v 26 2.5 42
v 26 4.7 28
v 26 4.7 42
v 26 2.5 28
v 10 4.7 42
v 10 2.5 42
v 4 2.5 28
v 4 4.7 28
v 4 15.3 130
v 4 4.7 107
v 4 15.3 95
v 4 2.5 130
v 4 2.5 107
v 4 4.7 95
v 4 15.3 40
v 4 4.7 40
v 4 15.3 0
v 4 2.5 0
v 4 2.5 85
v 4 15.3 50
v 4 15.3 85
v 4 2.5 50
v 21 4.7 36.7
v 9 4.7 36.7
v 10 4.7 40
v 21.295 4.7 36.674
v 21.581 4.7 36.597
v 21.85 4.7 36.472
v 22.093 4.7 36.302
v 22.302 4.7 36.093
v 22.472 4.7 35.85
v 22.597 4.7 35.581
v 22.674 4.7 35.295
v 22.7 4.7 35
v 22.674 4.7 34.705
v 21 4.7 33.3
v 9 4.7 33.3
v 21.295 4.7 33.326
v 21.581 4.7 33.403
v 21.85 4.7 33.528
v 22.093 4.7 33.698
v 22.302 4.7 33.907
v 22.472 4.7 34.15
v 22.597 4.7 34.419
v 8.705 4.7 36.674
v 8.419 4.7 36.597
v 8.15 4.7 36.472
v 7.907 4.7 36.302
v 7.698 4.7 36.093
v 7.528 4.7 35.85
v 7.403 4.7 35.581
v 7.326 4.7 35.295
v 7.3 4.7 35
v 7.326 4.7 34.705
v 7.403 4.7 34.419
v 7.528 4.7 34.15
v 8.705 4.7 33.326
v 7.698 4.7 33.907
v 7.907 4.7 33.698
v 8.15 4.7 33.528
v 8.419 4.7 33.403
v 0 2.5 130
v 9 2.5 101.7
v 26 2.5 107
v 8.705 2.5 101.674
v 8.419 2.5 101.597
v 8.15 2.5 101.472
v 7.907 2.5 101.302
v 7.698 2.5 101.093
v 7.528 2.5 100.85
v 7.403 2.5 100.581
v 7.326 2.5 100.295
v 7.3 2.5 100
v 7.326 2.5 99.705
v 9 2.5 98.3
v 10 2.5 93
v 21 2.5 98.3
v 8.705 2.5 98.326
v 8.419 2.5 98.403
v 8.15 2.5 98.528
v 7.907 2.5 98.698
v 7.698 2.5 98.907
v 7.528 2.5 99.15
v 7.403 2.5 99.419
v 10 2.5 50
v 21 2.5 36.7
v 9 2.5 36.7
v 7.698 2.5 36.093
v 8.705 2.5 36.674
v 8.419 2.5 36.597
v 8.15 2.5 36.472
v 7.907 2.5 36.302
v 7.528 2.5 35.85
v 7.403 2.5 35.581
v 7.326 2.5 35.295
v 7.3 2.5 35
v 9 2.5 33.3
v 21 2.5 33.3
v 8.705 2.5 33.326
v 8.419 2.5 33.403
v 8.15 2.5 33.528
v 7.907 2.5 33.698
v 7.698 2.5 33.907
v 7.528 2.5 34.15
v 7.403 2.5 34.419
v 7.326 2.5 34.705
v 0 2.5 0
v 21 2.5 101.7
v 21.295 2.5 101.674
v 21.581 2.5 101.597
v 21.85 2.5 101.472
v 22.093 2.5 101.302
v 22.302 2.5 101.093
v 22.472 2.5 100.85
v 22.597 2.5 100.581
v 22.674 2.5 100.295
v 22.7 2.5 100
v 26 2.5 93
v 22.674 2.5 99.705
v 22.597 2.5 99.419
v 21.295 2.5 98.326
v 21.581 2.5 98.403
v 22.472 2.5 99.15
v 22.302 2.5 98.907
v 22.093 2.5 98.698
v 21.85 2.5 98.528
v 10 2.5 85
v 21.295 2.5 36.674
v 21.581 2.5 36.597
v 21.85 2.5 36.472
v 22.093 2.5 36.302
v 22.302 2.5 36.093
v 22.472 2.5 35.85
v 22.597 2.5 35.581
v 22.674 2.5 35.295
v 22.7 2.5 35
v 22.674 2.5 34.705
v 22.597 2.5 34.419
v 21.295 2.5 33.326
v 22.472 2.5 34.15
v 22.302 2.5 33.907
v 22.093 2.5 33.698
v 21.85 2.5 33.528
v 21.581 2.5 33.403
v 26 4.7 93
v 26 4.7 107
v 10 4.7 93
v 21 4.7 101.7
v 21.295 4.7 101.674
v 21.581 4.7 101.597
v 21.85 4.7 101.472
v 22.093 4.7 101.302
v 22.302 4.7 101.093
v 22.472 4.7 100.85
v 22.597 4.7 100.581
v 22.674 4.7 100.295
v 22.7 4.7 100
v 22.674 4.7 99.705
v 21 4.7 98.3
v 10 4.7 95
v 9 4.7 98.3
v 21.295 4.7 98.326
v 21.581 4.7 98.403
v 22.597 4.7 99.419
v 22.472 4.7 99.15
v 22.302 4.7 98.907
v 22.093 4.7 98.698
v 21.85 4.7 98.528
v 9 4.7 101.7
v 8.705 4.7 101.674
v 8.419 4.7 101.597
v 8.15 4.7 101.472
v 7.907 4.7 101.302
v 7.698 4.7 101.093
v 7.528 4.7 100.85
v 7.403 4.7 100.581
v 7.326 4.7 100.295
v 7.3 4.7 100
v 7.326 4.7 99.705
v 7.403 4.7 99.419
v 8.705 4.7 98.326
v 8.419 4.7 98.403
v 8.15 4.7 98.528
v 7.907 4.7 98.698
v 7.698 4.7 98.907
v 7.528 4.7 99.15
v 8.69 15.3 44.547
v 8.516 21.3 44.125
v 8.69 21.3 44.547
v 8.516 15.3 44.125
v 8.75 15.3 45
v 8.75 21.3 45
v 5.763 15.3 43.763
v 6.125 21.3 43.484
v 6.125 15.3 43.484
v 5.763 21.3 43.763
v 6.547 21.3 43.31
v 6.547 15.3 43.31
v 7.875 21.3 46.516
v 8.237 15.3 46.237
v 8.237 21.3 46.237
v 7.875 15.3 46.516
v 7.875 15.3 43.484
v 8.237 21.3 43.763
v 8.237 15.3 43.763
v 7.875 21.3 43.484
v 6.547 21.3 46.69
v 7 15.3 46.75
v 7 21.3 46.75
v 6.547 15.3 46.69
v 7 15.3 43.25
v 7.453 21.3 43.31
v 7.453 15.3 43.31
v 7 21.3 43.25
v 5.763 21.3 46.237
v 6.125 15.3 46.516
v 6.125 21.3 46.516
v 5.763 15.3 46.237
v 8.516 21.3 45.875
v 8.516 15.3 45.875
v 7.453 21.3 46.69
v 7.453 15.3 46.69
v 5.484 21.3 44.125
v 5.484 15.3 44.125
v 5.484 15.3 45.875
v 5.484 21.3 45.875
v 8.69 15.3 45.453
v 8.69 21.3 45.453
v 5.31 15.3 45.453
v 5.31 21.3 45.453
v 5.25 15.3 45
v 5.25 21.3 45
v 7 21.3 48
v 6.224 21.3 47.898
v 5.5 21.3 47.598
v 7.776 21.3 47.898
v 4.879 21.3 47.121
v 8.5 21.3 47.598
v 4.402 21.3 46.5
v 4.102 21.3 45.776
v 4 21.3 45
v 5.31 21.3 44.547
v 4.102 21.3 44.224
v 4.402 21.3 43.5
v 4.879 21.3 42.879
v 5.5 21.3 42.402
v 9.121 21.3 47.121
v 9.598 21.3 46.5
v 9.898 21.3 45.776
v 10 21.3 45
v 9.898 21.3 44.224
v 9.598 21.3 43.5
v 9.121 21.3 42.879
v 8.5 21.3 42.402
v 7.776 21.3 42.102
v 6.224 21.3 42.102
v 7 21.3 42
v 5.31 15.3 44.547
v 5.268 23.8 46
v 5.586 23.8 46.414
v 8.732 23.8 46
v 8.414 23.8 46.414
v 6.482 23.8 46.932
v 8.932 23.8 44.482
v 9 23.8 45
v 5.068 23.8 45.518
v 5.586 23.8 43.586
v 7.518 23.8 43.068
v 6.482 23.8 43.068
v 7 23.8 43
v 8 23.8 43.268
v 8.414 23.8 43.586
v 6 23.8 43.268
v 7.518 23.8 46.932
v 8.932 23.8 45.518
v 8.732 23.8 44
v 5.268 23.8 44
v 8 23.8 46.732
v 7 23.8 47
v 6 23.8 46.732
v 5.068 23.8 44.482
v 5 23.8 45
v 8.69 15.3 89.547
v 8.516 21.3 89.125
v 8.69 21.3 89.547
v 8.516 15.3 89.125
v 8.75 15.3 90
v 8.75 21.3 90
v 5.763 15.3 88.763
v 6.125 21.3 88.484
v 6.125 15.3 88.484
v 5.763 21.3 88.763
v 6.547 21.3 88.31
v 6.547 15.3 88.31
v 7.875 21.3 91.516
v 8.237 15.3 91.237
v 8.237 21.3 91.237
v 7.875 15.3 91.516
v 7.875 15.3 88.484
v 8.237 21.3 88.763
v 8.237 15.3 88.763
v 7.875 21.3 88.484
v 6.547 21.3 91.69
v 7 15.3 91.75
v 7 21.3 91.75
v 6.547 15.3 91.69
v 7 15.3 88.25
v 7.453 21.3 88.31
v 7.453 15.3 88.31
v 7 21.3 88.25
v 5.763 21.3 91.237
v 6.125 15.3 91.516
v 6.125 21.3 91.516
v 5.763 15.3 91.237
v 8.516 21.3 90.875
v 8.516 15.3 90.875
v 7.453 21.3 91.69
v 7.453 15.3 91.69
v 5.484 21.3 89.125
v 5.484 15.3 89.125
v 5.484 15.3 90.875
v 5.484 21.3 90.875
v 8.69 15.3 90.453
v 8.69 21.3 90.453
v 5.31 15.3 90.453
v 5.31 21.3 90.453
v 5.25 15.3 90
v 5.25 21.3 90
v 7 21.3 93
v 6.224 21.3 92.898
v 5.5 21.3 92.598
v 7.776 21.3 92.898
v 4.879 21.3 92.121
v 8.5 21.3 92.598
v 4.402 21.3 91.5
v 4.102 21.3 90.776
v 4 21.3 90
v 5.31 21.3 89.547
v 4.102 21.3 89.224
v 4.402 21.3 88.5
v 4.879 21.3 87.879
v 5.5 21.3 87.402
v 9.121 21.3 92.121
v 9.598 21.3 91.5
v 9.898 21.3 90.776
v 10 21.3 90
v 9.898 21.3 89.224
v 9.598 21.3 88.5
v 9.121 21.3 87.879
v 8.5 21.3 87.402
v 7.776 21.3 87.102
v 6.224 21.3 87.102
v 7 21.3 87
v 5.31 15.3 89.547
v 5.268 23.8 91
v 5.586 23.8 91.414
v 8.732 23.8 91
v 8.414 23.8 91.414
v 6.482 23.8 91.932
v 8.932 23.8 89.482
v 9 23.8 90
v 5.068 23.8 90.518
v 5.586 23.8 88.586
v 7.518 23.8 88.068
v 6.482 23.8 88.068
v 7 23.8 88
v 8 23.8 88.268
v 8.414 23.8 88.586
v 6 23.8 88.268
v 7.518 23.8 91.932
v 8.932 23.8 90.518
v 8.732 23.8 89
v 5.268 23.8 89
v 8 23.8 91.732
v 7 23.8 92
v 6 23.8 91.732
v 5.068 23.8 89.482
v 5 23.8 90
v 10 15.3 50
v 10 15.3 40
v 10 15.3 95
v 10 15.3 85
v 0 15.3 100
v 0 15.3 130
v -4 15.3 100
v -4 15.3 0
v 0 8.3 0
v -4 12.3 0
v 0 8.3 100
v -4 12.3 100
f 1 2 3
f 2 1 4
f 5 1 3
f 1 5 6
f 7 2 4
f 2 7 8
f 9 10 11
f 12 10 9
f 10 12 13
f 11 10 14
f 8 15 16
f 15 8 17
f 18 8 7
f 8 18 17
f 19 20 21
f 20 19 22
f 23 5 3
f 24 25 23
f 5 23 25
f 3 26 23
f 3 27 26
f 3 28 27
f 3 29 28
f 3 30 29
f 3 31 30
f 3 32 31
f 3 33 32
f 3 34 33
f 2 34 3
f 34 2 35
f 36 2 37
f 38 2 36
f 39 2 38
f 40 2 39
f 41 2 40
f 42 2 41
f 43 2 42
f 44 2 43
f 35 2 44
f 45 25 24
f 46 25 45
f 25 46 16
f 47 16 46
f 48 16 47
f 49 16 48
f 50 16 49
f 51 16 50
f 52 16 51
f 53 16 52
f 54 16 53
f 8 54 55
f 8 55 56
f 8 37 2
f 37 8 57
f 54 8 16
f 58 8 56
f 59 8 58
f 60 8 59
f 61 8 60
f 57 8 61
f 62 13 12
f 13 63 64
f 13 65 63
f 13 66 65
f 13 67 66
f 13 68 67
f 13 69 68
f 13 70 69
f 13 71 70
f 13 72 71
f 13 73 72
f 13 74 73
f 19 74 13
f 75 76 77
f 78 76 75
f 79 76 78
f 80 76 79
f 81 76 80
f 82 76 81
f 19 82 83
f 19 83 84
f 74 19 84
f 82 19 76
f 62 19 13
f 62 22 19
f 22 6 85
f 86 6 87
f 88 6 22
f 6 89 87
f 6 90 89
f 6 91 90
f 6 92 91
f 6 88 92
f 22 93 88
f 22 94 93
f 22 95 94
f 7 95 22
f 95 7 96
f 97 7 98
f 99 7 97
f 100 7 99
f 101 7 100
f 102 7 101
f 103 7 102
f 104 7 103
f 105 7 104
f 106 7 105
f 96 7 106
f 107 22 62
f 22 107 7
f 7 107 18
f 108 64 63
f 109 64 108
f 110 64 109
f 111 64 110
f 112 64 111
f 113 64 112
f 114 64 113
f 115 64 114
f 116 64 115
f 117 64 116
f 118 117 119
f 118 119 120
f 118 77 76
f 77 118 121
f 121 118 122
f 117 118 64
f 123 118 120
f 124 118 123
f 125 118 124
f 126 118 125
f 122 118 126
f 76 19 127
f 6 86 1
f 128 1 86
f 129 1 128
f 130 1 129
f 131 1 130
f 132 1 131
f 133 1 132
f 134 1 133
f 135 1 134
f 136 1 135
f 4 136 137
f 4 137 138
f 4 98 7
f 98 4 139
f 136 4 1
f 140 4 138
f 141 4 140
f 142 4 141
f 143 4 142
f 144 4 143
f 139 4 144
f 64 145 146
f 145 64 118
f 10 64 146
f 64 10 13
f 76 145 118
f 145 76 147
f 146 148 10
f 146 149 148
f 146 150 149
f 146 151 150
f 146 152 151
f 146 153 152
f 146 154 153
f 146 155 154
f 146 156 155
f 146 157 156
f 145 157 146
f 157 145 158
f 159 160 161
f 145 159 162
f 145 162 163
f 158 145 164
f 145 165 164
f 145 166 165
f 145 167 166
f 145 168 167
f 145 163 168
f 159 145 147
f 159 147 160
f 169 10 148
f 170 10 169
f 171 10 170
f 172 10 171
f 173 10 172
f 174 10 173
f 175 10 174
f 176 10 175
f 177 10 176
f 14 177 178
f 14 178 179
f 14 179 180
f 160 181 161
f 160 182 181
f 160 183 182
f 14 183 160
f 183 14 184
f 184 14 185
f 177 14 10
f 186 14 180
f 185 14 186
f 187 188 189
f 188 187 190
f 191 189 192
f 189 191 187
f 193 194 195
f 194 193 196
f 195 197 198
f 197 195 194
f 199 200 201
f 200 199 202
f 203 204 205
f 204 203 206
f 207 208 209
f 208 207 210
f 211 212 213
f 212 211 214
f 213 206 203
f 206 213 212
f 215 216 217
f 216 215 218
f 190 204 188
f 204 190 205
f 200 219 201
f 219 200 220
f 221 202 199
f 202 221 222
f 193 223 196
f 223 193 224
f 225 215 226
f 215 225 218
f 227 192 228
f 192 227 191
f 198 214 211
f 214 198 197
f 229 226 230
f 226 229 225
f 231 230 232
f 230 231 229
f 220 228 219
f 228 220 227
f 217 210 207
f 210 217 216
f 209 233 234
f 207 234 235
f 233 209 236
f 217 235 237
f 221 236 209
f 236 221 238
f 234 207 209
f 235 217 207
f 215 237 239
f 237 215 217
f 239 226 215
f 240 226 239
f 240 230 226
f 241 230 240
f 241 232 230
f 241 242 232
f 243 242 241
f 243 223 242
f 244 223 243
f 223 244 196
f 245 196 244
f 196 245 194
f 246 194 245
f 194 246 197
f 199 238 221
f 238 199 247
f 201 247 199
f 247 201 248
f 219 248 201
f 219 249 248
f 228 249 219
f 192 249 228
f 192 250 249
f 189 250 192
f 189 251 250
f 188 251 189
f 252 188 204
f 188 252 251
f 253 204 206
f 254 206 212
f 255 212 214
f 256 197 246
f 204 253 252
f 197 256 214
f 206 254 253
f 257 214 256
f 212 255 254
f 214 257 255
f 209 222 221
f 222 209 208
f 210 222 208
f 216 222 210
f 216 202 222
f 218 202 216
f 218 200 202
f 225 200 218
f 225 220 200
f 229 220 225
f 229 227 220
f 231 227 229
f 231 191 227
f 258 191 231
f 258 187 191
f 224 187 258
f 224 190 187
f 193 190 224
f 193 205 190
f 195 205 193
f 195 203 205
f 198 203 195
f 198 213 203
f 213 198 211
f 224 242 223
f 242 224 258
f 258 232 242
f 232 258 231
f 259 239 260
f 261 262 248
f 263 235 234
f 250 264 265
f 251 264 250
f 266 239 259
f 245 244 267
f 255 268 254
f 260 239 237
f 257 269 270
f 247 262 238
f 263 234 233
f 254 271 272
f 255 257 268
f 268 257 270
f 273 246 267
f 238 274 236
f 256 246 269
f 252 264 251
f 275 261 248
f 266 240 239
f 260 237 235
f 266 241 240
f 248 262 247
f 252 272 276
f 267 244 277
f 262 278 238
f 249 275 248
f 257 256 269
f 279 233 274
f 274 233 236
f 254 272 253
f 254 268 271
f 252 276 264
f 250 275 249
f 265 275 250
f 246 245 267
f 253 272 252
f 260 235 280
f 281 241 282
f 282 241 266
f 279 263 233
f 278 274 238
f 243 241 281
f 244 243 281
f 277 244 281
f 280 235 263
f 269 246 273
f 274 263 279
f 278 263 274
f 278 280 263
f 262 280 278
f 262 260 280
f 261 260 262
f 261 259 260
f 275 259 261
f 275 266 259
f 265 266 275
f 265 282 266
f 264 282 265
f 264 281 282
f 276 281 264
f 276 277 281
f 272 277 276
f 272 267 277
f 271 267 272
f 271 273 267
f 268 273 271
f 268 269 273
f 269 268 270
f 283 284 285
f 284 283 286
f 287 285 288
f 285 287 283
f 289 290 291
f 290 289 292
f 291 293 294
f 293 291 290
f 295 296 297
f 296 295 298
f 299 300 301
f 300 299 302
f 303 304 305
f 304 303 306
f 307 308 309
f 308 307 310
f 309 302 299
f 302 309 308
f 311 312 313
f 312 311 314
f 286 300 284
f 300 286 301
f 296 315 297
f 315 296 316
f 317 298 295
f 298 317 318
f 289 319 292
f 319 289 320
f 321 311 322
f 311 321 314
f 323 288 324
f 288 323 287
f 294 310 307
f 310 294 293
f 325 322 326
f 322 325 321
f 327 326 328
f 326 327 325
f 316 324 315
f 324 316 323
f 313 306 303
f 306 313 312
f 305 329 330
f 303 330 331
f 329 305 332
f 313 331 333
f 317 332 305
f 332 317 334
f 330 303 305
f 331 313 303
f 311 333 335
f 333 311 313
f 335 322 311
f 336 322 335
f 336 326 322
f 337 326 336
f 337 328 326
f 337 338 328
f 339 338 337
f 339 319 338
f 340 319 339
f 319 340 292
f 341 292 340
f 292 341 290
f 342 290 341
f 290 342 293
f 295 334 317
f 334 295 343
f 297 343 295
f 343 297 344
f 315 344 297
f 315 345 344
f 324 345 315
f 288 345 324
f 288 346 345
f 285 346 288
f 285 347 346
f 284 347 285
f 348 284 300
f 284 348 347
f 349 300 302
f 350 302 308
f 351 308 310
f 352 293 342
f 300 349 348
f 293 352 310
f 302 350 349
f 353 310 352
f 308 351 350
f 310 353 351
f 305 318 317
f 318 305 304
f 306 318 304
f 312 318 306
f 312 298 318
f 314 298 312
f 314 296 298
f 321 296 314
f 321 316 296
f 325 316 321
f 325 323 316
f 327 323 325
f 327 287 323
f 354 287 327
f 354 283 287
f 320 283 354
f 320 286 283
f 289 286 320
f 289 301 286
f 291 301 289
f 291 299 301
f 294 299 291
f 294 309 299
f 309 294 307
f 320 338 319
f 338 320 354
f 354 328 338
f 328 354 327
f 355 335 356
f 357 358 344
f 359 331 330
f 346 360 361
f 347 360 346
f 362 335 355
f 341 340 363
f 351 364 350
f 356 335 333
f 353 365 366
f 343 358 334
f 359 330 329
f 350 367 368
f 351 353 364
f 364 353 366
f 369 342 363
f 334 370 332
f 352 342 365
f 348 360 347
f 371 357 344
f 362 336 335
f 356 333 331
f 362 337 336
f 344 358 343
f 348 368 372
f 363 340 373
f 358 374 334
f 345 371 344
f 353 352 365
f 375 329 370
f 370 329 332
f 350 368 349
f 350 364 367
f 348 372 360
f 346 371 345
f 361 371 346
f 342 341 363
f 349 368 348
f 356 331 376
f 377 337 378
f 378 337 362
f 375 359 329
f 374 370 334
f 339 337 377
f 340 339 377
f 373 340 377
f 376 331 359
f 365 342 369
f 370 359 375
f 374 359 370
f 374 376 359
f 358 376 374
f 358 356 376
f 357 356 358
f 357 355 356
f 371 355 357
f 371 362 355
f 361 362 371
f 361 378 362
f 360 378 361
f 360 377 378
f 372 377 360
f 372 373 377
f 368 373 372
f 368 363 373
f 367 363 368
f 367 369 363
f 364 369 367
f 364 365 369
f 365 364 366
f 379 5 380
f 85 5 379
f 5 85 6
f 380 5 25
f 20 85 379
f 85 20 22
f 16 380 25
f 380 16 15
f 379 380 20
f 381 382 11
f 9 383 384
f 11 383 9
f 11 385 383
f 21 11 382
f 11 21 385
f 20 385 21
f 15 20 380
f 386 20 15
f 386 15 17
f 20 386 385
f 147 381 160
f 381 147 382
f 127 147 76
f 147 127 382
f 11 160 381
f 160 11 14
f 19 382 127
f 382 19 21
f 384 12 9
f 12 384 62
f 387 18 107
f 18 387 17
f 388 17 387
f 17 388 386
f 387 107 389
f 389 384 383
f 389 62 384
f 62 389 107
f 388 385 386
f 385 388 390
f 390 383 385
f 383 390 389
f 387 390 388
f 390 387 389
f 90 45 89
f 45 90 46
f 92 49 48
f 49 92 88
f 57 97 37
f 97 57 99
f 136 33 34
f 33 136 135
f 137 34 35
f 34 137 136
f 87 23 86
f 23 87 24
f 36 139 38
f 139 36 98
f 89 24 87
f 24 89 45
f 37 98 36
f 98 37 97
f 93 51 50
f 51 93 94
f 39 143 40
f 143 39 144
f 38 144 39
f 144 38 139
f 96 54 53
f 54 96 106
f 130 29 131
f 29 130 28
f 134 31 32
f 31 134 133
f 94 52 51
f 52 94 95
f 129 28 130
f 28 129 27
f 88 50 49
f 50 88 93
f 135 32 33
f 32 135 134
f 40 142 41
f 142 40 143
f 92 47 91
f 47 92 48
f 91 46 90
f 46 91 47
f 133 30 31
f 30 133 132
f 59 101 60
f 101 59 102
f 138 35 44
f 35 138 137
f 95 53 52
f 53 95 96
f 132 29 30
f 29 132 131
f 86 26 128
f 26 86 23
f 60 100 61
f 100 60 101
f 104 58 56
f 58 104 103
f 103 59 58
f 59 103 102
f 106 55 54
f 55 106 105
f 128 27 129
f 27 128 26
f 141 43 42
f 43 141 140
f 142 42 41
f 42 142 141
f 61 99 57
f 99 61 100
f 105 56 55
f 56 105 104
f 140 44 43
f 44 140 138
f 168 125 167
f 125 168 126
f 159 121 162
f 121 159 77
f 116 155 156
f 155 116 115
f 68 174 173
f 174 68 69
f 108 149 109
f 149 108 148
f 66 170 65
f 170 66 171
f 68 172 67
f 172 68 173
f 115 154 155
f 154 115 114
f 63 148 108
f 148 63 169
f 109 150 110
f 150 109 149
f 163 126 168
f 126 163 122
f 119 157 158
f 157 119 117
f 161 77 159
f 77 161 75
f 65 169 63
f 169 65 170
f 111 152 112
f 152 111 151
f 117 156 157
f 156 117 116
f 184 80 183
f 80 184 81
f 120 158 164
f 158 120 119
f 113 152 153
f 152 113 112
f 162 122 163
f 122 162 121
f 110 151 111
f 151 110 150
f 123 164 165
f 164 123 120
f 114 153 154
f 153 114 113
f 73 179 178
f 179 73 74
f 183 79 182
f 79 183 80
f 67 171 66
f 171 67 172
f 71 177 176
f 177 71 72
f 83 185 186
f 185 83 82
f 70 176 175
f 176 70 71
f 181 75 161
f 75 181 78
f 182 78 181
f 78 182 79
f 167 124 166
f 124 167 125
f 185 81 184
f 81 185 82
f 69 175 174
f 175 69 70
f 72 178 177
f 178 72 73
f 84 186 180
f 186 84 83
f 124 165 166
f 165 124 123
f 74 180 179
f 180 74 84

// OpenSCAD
// TRILHO MÓVEL DO BERÇO (direita): L com aba, duas linguetas com rasgos pra 2 parafusos M3 que atarraxam na chapa do berço.
// Desliza até encostar no celular; aperta. Imprime deitado (lingueta no prato). Faixa de ajuste: 10 mm por coluna de furos.
ph_t = 9; slot_t = ph_t + 0.8; back_t = 2.5; y_front = back_t + slot_t;
rail_h = 130; lip = 4; lip_top = 100; rail = 4; tab = 2.2;
$fn = 36;
difference() {
  union() {
    translate([0, back_t, 0]) cube([rail, y_front+3-back_t, rail_h]);                            // parede do trilho (apoia na chapa)
    hull() { translate([-lip, y_front, 0]) cube([lip, 3, lip_top]); translate([0, y_front-lip, 0]) cube([0.01, lip+3, lip_top]); } // aba que segura a frente do celular
    for (z=[35,100]) translate([rail, back_t, z-7]) cube([22, tab, 14]);                         // linguetas pra fora, encostadas na chapa
    for (z=[45,90]) { translate([rail, back_t, z-5]) cube([6, y_front+3-back_t, 10]); translate([rail+3, y_front+3, z]) rotate([-90,0,0]) { cylinder(d=3.5,h=6,$fn=24); translate([0,0,6]) cylinder(d1=6,d2=4,h=2.5,$fn=24); } } // orelha + pino da trava
  }
  for (z=[35,100]) hull() { translate([rail+5, back_t-1, z]) rotate([-90,0,0]) cylinder(d=3.4, h=tab+2); translate([rail+17, back_t-1, z]) rotate([-90,0,0]) cylinder(d=3.4, h=tab+2); } // rasgos
}
